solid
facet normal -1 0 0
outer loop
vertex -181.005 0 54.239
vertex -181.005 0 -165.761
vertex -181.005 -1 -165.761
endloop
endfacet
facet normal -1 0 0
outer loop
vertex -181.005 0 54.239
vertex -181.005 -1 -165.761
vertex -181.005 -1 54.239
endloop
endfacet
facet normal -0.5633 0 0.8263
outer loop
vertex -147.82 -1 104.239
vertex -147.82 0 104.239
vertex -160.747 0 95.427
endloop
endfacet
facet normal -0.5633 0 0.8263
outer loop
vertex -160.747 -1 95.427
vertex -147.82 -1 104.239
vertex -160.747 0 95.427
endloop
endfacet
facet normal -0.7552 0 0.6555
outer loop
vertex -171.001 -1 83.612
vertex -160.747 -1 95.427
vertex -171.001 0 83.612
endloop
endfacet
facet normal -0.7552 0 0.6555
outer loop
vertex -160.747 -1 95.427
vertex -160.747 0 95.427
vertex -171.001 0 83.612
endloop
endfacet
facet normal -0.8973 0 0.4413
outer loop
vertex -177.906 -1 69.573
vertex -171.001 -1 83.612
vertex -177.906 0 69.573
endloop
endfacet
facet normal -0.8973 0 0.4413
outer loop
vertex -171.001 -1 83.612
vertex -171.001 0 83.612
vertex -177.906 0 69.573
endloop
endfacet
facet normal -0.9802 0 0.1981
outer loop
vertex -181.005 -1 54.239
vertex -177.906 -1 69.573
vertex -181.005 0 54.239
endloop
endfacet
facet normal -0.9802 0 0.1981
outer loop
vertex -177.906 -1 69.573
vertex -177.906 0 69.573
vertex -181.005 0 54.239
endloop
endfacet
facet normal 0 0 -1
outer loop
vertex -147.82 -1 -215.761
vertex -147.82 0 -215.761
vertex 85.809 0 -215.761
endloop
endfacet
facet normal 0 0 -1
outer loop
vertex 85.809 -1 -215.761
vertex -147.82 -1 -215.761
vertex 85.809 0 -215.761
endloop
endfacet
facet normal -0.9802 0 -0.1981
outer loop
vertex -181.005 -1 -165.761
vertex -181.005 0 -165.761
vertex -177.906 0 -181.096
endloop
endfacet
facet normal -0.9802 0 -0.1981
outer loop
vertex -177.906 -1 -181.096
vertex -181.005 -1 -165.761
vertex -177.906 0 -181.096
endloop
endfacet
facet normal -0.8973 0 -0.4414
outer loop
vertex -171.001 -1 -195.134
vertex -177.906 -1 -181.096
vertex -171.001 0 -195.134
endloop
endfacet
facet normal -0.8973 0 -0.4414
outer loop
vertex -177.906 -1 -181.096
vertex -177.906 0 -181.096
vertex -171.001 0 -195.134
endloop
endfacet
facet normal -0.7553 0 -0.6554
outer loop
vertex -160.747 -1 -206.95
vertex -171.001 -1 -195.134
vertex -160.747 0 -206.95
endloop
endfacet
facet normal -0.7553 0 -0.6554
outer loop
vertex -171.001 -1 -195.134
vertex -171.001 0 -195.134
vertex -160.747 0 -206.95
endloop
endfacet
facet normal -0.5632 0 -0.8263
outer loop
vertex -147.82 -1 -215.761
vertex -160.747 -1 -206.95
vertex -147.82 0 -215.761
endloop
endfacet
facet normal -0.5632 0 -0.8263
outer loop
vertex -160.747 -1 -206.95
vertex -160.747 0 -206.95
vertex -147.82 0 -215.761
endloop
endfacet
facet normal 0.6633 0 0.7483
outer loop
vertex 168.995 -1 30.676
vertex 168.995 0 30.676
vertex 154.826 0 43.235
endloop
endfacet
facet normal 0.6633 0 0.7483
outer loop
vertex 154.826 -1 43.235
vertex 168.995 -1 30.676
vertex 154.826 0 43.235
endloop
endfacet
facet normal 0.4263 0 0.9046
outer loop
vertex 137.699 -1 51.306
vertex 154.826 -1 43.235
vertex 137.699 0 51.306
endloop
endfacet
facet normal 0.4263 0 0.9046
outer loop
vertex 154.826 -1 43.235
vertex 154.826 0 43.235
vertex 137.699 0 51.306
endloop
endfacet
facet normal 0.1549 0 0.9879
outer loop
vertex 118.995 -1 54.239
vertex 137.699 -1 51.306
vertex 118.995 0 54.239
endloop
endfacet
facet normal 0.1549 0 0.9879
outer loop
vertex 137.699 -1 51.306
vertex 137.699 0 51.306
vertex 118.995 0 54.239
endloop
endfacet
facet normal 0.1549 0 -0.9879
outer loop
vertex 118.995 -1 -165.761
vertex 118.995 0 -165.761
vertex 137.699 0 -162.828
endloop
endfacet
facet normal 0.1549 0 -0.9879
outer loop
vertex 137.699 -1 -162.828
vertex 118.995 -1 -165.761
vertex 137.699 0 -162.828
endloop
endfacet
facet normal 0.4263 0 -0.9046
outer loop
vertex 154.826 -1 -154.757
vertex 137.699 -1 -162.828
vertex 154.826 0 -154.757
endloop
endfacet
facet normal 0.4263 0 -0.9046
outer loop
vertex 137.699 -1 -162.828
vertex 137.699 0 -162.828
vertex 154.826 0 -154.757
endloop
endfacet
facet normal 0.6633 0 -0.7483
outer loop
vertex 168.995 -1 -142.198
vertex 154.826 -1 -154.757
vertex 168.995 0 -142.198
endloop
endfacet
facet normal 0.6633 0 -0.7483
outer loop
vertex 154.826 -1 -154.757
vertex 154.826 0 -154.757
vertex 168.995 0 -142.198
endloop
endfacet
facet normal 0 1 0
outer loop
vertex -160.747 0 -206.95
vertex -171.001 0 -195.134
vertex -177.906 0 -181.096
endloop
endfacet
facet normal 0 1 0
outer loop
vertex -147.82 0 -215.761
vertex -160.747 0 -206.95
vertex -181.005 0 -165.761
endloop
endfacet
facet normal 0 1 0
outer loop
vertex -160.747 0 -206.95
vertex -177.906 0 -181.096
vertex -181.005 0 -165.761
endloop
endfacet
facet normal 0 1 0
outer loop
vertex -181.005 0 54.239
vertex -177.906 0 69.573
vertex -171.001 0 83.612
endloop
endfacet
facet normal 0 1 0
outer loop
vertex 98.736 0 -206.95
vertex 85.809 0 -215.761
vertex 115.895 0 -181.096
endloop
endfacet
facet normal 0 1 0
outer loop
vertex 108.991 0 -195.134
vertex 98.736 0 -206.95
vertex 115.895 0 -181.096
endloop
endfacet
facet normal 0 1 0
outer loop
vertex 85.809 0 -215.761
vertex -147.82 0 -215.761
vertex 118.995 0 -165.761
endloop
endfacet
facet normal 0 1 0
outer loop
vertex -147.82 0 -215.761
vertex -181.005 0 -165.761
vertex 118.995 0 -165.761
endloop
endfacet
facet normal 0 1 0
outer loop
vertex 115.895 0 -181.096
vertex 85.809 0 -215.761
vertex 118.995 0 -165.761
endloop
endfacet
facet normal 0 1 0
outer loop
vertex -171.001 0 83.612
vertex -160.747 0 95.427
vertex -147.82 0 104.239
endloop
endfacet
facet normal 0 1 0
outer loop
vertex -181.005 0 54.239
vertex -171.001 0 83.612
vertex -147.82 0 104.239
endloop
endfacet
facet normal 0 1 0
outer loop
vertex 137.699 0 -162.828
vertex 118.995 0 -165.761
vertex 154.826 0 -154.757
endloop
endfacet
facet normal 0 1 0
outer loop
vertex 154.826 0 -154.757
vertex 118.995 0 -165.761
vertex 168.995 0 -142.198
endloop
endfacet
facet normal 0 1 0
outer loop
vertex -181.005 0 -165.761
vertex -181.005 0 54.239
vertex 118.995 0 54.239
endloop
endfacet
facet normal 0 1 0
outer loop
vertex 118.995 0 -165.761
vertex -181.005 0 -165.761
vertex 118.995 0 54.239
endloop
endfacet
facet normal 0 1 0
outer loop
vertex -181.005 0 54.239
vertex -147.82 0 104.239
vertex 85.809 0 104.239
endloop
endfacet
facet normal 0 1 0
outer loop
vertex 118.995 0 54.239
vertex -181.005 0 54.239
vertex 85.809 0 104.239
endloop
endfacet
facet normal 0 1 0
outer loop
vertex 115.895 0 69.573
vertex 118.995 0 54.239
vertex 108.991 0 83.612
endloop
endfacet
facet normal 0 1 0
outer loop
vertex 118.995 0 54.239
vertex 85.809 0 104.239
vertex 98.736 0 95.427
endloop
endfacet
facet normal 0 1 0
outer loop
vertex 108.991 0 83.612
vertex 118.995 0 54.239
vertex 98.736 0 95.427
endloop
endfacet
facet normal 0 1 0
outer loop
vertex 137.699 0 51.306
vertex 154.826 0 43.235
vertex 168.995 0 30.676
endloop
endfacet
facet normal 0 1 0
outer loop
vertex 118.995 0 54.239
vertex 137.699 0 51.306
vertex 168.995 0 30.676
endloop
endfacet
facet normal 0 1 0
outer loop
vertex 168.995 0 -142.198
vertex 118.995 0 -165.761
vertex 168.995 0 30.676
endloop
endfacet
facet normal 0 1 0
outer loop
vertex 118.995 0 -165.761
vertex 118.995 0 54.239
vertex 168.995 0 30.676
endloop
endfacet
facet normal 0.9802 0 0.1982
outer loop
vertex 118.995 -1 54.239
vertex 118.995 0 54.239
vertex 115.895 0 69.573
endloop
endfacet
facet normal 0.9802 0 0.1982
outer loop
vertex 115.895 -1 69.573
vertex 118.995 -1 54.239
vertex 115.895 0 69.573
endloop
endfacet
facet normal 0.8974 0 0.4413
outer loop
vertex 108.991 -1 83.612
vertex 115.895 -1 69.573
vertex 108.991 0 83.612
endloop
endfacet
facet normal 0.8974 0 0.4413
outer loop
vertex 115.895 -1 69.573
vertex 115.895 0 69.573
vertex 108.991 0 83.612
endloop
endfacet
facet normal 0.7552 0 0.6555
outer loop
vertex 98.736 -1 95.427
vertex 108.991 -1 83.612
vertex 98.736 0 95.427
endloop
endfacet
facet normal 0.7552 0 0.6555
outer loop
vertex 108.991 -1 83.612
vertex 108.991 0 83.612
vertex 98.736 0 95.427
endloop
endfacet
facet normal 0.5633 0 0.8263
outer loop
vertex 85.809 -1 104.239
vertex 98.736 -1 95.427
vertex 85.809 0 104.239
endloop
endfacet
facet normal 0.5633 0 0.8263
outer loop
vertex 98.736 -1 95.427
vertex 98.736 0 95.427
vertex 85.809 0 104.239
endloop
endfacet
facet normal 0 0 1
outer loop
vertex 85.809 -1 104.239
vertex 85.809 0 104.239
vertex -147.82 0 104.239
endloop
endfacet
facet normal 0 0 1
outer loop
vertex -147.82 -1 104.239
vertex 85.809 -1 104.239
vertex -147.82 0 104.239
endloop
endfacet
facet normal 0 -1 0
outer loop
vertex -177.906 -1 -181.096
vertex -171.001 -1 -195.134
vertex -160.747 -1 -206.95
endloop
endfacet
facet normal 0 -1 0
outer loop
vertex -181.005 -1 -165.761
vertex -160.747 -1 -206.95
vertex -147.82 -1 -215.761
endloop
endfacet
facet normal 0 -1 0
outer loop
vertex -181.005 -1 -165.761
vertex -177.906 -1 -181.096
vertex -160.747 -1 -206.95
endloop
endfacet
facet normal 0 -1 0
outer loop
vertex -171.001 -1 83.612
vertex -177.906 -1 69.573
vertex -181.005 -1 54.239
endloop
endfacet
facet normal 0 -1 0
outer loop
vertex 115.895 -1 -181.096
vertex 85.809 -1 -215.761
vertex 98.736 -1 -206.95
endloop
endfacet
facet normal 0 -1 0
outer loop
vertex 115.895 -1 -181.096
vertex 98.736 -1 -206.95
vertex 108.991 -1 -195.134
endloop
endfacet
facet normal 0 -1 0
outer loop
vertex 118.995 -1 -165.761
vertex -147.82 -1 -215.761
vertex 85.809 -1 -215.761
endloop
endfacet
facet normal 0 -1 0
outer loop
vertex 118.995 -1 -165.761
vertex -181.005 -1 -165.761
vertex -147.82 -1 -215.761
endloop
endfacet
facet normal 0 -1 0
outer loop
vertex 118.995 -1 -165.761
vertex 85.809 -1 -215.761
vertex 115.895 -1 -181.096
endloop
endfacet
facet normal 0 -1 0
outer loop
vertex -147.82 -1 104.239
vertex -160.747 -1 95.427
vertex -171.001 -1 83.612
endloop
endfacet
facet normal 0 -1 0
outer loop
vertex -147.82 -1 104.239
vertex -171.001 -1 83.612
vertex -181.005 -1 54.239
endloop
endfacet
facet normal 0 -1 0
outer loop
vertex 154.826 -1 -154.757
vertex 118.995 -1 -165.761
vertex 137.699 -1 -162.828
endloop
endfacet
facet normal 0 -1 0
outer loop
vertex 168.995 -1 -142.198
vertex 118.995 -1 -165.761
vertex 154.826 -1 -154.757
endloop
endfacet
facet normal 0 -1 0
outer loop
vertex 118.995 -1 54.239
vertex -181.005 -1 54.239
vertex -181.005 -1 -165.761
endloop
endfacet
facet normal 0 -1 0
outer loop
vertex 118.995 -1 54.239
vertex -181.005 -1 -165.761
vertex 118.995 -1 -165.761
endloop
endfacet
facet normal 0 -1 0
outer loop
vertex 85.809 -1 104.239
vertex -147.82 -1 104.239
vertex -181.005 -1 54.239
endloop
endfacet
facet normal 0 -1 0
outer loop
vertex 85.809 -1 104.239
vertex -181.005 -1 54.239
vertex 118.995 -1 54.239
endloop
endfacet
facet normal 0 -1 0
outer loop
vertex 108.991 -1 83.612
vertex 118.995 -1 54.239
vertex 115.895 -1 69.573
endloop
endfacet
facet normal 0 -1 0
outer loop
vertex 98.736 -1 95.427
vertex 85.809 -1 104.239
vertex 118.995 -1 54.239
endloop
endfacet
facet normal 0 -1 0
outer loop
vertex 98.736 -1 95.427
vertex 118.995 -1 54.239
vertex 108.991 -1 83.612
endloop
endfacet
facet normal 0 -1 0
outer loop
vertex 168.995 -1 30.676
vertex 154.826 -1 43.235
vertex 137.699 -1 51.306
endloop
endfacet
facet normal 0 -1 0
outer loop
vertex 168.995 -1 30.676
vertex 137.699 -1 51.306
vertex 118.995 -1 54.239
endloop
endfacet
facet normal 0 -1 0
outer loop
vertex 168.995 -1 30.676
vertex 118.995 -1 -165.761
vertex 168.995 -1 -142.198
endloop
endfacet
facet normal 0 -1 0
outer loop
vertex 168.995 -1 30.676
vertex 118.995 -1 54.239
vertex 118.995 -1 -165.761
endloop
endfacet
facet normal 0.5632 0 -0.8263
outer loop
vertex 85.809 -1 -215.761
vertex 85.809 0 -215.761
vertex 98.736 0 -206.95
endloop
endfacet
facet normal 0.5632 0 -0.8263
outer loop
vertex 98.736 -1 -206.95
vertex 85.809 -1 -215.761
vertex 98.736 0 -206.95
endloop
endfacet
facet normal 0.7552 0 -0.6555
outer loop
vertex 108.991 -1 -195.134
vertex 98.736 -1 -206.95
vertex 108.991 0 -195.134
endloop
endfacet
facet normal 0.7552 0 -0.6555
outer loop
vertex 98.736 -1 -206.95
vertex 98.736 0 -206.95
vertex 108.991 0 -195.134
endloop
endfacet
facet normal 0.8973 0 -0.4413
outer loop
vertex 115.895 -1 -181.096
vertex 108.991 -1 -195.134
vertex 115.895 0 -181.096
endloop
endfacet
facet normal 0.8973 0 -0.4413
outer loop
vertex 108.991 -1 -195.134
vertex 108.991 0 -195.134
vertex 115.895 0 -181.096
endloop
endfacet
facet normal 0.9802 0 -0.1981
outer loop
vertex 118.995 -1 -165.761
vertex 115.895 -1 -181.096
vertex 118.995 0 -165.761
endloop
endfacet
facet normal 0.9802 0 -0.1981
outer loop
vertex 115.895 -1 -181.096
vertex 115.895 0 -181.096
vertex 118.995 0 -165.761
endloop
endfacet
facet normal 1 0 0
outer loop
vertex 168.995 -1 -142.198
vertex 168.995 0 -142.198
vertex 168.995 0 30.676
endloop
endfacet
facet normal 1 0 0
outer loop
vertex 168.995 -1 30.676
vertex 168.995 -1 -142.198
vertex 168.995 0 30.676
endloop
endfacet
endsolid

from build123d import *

# Parameters (mm, degrees)
F0_W     = 300
F0_H     = 220
F1_DEPTH = 1


with BuildPart() as f1:
    # F0 (on Front) → F1 (new body)
    with BuildSketch(Plane.XZ):
        with BuildLine():
            Line((85.809135, 104.238631), (-147.819877, 104.238631))
            ThreePointArc((-147.819877, 104.238631), (-171.001324, 83.611616), (-181.005371, 54.238631))
            Line((-181.005371, 54.238631), (118.994629, 54.238631))
            ThreePointArc((118.994629, 54.238631), (108.990582, 83.611616), (85.809135, 104.238631))
        make_face()
        with Locations((-31.005371, -55.761369)):
            Rectangle(F0_W, F0_H)
        with BuildLine():
            ThreePointArc((168.994629, 30.675642), (146.5507, 47.881048), (118.994629, 54.238631))
            Line((118.994629, 54.238631), (118.994629, -165.761369))
            ThreePointArc((118.994629, -165.761369), (146.5507, -159.403787), (168.994629, -142.198381))
            Line((168.994629, -142.198381), (168.994629, 30.675642))
        make_face()
        with BuildLine():
            Line((118.994629, -165.761369), (-181.005371, -165.761369))
            ThreePointArc((-181.005371, -165.761369), (-171.001324, -195.134355), (-147.819877, -215.761369))
            Line((-147.819877, -215.761369), (85.809135, -215.761369))
            ThreePointArc((85.809135, -215.761369), (108.990582, -195.134355), (118.994629, -165.761369))
        make_face()
    extrude(amount=F1_DEPTH)


solid = f1.part
